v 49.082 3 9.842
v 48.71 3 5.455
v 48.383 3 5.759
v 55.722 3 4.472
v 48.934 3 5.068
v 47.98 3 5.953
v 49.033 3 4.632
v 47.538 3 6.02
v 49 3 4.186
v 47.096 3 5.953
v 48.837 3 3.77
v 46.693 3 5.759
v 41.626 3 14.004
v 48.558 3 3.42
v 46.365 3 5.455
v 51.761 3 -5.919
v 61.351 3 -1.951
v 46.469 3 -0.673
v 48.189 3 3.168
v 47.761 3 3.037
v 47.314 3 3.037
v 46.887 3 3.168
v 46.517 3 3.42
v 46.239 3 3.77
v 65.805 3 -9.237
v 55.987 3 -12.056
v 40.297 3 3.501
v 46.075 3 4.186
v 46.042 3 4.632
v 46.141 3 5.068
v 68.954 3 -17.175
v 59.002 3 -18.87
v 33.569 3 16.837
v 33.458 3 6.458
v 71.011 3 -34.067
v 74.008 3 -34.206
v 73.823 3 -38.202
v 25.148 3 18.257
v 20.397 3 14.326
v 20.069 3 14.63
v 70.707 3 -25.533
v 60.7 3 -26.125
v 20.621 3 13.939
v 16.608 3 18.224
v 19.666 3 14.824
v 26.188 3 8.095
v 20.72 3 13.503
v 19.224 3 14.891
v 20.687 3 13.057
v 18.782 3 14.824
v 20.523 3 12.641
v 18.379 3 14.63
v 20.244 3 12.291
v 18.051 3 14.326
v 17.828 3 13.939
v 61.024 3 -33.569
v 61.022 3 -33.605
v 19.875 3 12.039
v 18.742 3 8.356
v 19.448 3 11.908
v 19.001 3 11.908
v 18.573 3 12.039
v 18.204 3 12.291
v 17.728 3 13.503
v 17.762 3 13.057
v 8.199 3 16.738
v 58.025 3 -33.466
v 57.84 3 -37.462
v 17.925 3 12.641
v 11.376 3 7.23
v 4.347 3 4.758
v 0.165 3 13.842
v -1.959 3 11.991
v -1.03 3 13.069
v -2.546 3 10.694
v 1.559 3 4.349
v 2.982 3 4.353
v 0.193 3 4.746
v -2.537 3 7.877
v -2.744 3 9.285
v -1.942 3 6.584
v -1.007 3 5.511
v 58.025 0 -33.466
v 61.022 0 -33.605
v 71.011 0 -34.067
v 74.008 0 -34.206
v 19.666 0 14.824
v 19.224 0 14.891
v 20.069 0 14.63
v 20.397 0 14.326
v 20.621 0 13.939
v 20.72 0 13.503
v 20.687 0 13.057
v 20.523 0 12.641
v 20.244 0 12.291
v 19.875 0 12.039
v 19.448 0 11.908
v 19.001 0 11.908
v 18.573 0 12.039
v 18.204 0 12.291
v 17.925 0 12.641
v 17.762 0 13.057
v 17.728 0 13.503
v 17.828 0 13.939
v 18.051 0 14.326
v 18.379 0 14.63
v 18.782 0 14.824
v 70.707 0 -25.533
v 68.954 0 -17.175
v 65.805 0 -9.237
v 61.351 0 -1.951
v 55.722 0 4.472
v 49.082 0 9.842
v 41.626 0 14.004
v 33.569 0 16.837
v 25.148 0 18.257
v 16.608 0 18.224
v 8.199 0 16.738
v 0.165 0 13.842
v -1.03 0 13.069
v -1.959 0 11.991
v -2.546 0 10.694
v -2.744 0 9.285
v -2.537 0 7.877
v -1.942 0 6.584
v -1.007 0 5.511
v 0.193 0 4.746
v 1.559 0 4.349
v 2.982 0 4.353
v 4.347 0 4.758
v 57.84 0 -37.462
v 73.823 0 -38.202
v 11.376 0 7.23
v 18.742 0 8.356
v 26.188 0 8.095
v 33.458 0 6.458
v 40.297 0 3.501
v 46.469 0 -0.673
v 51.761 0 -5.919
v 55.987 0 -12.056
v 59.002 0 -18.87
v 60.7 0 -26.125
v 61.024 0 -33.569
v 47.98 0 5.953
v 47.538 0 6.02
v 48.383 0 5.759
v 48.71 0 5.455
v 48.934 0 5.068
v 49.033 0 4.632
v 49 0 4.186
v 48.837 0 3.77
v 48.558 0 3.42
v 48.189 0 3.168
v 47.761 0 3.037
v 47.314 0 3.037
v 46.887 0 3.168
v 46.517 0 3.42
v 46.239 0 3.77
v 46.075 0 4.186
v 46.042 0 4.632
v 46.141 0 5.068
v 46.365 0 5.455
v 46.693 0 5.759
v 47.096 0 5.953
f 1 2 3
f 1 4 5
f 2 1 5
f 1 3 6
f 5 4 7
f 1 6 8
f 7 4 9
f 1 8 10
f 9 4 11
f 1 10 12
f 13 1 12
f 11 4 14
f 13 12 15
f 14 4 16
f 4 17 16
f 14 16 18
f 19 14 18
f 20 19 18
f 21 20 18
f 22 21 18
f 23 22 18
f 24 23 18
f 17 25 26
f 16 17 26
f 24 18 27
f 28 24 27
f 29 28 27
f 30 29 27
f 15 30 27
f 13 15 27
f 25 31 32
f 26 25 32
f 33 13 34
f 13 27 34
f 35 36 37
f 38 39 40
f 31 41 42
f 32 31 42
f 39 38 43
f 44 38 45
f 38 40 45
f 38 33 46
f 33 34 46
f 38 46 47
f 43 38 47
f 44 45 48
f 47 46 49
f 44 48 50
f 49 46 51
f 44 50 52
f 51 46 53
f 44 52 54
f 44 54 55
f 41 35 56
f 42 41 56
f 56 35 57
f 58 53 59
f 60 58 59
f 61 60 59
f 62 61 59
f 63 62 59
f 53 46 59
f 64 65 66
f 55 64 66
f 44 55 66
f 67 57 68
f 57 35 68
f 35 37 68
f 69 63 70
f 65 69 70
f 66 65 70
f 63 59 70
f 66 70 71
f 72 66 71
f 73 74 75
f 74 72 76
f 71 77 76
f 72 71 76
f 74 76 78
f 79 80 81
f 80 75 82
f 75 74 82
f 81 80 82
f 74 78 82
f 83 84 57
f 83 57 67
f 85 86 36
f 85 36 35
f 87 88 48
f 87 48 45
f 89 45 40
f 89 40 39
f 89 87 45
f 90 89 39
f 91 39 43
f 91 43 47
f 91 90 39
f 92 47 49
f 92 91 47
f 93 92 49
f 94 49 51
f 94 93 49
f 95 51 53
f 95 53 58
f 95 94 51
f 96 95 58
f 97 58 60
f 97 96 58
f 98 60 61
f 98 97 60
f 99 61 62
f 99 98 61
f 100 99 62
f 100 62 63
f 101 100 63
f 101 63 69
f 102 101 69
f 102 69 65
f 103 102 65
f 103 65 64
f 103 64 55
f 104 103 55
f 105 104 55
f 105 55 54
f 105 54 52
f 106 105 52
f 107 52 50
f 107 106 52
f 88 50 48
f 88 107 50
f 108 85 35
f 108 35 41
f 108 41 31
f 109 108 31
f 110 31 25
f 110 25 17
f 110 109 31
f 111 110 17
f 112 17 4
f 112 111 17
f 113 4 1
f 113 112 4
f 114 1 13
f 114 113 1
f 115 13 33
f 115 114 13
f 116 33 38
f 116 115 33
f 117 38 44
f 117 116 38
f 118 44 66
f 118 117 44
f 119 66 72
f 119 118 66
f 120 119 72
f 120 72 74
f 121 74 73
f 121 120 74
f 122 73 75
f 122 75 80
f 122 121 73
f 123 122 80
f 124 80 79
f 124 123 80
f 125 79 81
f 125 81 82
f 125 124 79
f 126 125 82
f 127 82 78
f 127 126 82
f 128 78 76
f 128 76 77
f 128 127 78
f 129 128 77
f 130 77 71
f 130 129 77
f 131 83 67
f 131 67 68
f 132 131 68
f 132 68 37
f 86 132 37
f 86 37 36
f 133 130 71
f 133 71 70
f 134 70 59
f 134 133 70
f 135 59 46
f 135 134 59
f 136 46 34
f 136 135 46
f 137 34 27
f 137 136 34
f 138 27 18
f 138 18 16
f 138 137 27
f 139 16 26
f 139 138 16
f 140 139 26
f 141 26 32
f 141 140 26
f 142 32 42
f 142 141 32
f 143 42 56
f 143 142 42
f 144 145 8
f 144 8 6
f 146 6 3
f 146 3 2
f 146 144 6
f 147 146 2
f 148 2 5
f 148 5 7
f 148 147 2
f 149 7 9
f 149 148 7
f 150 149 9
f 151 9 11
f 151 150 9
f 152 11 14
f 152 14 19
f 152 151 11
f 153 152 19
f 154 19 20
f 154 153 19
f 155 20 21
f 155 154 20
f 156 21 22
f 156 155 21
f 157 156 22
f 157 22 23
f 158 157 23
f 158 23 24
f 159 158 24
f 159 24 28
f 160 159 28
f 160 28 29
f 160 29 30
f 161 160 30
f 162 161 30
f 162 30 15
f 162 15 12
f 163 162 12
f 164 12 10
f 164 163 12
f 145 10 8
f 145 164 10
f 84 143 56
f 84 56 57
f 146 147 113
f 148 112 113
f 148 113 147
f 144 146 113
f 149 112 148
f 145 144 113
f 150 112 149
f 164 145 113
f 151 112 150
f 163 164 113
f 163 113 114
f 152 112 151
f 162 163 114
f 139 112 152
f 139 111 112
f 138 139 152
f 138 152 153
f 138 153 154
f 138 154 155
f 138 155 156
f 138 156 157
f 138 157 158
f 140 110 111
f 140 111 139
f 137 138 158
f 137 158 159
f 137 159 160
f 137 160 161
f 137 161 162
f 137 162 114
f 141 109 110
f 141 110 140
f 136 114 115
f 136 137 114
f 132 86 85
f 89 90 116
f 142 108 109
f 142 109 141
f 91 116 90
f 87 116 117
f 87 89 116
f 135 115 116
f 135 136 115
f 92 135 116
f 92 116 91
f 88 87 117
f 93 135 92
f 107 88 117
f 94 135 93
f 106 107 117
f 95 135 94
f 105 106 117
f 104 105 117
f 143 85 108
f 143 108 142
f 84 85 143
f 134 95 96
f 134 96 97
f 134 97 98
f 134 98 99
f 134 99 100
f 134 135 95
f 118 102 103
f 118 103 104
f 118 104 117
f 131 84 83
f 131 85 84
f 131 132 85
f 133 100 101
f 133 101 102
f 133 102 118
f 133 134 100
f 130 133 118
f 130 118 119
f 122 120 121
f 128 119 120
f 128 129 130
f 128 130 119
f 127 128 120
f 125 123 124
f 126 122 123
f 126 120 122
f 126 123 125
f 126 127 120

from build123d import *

# Parameters (mm, degrees)
SKETCH_1_R      = 1.5
EXTRUDE_1_DEPTH = 3


with BuildPart() as part:
    # 草图1 → 凸台-拉伸1 (new body)
    with BuildSketch(Plane(origin=(0, 0, 0), x_dir=(1, 0, 0), z_dir=(0, 1, 0))):
        with BuildLine():
            Line((61.021952874, 33.604841535), (61.023746461, 33.569203074))
            ThreePointArc((61.023746461, 33.569203074), (43.480612021, -1.558361335), (4.346639213, -4.758286247))
            ThreePointArc((4.346639213, -4.758286247), (-2.286053035, -7.209284728), (0.164945446, -13.841976975))
            ThreePointArc((0.164945446, -13.841976975), (49.082411457, -9.842070835), (71.011329506, 34.067384676))
            Line((71.011329506, 34.067384676), (74.008078898, 34.206144673))
            Line((74.008078898, 34.206144673), (73.823063114, 38.201863527))
            Line((73.823063114, 38.201863527), (57.840187699, 37.461800392))
            Line((57.840187699, 37.461800392), (58.025203482, 33.466081538))
            Line((58.025203482, 33.466081538), (61.021952874, 33.604841535))
        make_face()
        with Locations((19.224207172, -13.390815296)):
            Circle(SKETCH_1_R, mode=Mode.SUBTRACT)
        with Locations((47.537682651, -4.519860589)):
            Circle(SKETCH_1_R, mode=Mode.SUBTRACT)
    extrude(amount=EXTRUDE_1_DEPTH)


solid = part.part
